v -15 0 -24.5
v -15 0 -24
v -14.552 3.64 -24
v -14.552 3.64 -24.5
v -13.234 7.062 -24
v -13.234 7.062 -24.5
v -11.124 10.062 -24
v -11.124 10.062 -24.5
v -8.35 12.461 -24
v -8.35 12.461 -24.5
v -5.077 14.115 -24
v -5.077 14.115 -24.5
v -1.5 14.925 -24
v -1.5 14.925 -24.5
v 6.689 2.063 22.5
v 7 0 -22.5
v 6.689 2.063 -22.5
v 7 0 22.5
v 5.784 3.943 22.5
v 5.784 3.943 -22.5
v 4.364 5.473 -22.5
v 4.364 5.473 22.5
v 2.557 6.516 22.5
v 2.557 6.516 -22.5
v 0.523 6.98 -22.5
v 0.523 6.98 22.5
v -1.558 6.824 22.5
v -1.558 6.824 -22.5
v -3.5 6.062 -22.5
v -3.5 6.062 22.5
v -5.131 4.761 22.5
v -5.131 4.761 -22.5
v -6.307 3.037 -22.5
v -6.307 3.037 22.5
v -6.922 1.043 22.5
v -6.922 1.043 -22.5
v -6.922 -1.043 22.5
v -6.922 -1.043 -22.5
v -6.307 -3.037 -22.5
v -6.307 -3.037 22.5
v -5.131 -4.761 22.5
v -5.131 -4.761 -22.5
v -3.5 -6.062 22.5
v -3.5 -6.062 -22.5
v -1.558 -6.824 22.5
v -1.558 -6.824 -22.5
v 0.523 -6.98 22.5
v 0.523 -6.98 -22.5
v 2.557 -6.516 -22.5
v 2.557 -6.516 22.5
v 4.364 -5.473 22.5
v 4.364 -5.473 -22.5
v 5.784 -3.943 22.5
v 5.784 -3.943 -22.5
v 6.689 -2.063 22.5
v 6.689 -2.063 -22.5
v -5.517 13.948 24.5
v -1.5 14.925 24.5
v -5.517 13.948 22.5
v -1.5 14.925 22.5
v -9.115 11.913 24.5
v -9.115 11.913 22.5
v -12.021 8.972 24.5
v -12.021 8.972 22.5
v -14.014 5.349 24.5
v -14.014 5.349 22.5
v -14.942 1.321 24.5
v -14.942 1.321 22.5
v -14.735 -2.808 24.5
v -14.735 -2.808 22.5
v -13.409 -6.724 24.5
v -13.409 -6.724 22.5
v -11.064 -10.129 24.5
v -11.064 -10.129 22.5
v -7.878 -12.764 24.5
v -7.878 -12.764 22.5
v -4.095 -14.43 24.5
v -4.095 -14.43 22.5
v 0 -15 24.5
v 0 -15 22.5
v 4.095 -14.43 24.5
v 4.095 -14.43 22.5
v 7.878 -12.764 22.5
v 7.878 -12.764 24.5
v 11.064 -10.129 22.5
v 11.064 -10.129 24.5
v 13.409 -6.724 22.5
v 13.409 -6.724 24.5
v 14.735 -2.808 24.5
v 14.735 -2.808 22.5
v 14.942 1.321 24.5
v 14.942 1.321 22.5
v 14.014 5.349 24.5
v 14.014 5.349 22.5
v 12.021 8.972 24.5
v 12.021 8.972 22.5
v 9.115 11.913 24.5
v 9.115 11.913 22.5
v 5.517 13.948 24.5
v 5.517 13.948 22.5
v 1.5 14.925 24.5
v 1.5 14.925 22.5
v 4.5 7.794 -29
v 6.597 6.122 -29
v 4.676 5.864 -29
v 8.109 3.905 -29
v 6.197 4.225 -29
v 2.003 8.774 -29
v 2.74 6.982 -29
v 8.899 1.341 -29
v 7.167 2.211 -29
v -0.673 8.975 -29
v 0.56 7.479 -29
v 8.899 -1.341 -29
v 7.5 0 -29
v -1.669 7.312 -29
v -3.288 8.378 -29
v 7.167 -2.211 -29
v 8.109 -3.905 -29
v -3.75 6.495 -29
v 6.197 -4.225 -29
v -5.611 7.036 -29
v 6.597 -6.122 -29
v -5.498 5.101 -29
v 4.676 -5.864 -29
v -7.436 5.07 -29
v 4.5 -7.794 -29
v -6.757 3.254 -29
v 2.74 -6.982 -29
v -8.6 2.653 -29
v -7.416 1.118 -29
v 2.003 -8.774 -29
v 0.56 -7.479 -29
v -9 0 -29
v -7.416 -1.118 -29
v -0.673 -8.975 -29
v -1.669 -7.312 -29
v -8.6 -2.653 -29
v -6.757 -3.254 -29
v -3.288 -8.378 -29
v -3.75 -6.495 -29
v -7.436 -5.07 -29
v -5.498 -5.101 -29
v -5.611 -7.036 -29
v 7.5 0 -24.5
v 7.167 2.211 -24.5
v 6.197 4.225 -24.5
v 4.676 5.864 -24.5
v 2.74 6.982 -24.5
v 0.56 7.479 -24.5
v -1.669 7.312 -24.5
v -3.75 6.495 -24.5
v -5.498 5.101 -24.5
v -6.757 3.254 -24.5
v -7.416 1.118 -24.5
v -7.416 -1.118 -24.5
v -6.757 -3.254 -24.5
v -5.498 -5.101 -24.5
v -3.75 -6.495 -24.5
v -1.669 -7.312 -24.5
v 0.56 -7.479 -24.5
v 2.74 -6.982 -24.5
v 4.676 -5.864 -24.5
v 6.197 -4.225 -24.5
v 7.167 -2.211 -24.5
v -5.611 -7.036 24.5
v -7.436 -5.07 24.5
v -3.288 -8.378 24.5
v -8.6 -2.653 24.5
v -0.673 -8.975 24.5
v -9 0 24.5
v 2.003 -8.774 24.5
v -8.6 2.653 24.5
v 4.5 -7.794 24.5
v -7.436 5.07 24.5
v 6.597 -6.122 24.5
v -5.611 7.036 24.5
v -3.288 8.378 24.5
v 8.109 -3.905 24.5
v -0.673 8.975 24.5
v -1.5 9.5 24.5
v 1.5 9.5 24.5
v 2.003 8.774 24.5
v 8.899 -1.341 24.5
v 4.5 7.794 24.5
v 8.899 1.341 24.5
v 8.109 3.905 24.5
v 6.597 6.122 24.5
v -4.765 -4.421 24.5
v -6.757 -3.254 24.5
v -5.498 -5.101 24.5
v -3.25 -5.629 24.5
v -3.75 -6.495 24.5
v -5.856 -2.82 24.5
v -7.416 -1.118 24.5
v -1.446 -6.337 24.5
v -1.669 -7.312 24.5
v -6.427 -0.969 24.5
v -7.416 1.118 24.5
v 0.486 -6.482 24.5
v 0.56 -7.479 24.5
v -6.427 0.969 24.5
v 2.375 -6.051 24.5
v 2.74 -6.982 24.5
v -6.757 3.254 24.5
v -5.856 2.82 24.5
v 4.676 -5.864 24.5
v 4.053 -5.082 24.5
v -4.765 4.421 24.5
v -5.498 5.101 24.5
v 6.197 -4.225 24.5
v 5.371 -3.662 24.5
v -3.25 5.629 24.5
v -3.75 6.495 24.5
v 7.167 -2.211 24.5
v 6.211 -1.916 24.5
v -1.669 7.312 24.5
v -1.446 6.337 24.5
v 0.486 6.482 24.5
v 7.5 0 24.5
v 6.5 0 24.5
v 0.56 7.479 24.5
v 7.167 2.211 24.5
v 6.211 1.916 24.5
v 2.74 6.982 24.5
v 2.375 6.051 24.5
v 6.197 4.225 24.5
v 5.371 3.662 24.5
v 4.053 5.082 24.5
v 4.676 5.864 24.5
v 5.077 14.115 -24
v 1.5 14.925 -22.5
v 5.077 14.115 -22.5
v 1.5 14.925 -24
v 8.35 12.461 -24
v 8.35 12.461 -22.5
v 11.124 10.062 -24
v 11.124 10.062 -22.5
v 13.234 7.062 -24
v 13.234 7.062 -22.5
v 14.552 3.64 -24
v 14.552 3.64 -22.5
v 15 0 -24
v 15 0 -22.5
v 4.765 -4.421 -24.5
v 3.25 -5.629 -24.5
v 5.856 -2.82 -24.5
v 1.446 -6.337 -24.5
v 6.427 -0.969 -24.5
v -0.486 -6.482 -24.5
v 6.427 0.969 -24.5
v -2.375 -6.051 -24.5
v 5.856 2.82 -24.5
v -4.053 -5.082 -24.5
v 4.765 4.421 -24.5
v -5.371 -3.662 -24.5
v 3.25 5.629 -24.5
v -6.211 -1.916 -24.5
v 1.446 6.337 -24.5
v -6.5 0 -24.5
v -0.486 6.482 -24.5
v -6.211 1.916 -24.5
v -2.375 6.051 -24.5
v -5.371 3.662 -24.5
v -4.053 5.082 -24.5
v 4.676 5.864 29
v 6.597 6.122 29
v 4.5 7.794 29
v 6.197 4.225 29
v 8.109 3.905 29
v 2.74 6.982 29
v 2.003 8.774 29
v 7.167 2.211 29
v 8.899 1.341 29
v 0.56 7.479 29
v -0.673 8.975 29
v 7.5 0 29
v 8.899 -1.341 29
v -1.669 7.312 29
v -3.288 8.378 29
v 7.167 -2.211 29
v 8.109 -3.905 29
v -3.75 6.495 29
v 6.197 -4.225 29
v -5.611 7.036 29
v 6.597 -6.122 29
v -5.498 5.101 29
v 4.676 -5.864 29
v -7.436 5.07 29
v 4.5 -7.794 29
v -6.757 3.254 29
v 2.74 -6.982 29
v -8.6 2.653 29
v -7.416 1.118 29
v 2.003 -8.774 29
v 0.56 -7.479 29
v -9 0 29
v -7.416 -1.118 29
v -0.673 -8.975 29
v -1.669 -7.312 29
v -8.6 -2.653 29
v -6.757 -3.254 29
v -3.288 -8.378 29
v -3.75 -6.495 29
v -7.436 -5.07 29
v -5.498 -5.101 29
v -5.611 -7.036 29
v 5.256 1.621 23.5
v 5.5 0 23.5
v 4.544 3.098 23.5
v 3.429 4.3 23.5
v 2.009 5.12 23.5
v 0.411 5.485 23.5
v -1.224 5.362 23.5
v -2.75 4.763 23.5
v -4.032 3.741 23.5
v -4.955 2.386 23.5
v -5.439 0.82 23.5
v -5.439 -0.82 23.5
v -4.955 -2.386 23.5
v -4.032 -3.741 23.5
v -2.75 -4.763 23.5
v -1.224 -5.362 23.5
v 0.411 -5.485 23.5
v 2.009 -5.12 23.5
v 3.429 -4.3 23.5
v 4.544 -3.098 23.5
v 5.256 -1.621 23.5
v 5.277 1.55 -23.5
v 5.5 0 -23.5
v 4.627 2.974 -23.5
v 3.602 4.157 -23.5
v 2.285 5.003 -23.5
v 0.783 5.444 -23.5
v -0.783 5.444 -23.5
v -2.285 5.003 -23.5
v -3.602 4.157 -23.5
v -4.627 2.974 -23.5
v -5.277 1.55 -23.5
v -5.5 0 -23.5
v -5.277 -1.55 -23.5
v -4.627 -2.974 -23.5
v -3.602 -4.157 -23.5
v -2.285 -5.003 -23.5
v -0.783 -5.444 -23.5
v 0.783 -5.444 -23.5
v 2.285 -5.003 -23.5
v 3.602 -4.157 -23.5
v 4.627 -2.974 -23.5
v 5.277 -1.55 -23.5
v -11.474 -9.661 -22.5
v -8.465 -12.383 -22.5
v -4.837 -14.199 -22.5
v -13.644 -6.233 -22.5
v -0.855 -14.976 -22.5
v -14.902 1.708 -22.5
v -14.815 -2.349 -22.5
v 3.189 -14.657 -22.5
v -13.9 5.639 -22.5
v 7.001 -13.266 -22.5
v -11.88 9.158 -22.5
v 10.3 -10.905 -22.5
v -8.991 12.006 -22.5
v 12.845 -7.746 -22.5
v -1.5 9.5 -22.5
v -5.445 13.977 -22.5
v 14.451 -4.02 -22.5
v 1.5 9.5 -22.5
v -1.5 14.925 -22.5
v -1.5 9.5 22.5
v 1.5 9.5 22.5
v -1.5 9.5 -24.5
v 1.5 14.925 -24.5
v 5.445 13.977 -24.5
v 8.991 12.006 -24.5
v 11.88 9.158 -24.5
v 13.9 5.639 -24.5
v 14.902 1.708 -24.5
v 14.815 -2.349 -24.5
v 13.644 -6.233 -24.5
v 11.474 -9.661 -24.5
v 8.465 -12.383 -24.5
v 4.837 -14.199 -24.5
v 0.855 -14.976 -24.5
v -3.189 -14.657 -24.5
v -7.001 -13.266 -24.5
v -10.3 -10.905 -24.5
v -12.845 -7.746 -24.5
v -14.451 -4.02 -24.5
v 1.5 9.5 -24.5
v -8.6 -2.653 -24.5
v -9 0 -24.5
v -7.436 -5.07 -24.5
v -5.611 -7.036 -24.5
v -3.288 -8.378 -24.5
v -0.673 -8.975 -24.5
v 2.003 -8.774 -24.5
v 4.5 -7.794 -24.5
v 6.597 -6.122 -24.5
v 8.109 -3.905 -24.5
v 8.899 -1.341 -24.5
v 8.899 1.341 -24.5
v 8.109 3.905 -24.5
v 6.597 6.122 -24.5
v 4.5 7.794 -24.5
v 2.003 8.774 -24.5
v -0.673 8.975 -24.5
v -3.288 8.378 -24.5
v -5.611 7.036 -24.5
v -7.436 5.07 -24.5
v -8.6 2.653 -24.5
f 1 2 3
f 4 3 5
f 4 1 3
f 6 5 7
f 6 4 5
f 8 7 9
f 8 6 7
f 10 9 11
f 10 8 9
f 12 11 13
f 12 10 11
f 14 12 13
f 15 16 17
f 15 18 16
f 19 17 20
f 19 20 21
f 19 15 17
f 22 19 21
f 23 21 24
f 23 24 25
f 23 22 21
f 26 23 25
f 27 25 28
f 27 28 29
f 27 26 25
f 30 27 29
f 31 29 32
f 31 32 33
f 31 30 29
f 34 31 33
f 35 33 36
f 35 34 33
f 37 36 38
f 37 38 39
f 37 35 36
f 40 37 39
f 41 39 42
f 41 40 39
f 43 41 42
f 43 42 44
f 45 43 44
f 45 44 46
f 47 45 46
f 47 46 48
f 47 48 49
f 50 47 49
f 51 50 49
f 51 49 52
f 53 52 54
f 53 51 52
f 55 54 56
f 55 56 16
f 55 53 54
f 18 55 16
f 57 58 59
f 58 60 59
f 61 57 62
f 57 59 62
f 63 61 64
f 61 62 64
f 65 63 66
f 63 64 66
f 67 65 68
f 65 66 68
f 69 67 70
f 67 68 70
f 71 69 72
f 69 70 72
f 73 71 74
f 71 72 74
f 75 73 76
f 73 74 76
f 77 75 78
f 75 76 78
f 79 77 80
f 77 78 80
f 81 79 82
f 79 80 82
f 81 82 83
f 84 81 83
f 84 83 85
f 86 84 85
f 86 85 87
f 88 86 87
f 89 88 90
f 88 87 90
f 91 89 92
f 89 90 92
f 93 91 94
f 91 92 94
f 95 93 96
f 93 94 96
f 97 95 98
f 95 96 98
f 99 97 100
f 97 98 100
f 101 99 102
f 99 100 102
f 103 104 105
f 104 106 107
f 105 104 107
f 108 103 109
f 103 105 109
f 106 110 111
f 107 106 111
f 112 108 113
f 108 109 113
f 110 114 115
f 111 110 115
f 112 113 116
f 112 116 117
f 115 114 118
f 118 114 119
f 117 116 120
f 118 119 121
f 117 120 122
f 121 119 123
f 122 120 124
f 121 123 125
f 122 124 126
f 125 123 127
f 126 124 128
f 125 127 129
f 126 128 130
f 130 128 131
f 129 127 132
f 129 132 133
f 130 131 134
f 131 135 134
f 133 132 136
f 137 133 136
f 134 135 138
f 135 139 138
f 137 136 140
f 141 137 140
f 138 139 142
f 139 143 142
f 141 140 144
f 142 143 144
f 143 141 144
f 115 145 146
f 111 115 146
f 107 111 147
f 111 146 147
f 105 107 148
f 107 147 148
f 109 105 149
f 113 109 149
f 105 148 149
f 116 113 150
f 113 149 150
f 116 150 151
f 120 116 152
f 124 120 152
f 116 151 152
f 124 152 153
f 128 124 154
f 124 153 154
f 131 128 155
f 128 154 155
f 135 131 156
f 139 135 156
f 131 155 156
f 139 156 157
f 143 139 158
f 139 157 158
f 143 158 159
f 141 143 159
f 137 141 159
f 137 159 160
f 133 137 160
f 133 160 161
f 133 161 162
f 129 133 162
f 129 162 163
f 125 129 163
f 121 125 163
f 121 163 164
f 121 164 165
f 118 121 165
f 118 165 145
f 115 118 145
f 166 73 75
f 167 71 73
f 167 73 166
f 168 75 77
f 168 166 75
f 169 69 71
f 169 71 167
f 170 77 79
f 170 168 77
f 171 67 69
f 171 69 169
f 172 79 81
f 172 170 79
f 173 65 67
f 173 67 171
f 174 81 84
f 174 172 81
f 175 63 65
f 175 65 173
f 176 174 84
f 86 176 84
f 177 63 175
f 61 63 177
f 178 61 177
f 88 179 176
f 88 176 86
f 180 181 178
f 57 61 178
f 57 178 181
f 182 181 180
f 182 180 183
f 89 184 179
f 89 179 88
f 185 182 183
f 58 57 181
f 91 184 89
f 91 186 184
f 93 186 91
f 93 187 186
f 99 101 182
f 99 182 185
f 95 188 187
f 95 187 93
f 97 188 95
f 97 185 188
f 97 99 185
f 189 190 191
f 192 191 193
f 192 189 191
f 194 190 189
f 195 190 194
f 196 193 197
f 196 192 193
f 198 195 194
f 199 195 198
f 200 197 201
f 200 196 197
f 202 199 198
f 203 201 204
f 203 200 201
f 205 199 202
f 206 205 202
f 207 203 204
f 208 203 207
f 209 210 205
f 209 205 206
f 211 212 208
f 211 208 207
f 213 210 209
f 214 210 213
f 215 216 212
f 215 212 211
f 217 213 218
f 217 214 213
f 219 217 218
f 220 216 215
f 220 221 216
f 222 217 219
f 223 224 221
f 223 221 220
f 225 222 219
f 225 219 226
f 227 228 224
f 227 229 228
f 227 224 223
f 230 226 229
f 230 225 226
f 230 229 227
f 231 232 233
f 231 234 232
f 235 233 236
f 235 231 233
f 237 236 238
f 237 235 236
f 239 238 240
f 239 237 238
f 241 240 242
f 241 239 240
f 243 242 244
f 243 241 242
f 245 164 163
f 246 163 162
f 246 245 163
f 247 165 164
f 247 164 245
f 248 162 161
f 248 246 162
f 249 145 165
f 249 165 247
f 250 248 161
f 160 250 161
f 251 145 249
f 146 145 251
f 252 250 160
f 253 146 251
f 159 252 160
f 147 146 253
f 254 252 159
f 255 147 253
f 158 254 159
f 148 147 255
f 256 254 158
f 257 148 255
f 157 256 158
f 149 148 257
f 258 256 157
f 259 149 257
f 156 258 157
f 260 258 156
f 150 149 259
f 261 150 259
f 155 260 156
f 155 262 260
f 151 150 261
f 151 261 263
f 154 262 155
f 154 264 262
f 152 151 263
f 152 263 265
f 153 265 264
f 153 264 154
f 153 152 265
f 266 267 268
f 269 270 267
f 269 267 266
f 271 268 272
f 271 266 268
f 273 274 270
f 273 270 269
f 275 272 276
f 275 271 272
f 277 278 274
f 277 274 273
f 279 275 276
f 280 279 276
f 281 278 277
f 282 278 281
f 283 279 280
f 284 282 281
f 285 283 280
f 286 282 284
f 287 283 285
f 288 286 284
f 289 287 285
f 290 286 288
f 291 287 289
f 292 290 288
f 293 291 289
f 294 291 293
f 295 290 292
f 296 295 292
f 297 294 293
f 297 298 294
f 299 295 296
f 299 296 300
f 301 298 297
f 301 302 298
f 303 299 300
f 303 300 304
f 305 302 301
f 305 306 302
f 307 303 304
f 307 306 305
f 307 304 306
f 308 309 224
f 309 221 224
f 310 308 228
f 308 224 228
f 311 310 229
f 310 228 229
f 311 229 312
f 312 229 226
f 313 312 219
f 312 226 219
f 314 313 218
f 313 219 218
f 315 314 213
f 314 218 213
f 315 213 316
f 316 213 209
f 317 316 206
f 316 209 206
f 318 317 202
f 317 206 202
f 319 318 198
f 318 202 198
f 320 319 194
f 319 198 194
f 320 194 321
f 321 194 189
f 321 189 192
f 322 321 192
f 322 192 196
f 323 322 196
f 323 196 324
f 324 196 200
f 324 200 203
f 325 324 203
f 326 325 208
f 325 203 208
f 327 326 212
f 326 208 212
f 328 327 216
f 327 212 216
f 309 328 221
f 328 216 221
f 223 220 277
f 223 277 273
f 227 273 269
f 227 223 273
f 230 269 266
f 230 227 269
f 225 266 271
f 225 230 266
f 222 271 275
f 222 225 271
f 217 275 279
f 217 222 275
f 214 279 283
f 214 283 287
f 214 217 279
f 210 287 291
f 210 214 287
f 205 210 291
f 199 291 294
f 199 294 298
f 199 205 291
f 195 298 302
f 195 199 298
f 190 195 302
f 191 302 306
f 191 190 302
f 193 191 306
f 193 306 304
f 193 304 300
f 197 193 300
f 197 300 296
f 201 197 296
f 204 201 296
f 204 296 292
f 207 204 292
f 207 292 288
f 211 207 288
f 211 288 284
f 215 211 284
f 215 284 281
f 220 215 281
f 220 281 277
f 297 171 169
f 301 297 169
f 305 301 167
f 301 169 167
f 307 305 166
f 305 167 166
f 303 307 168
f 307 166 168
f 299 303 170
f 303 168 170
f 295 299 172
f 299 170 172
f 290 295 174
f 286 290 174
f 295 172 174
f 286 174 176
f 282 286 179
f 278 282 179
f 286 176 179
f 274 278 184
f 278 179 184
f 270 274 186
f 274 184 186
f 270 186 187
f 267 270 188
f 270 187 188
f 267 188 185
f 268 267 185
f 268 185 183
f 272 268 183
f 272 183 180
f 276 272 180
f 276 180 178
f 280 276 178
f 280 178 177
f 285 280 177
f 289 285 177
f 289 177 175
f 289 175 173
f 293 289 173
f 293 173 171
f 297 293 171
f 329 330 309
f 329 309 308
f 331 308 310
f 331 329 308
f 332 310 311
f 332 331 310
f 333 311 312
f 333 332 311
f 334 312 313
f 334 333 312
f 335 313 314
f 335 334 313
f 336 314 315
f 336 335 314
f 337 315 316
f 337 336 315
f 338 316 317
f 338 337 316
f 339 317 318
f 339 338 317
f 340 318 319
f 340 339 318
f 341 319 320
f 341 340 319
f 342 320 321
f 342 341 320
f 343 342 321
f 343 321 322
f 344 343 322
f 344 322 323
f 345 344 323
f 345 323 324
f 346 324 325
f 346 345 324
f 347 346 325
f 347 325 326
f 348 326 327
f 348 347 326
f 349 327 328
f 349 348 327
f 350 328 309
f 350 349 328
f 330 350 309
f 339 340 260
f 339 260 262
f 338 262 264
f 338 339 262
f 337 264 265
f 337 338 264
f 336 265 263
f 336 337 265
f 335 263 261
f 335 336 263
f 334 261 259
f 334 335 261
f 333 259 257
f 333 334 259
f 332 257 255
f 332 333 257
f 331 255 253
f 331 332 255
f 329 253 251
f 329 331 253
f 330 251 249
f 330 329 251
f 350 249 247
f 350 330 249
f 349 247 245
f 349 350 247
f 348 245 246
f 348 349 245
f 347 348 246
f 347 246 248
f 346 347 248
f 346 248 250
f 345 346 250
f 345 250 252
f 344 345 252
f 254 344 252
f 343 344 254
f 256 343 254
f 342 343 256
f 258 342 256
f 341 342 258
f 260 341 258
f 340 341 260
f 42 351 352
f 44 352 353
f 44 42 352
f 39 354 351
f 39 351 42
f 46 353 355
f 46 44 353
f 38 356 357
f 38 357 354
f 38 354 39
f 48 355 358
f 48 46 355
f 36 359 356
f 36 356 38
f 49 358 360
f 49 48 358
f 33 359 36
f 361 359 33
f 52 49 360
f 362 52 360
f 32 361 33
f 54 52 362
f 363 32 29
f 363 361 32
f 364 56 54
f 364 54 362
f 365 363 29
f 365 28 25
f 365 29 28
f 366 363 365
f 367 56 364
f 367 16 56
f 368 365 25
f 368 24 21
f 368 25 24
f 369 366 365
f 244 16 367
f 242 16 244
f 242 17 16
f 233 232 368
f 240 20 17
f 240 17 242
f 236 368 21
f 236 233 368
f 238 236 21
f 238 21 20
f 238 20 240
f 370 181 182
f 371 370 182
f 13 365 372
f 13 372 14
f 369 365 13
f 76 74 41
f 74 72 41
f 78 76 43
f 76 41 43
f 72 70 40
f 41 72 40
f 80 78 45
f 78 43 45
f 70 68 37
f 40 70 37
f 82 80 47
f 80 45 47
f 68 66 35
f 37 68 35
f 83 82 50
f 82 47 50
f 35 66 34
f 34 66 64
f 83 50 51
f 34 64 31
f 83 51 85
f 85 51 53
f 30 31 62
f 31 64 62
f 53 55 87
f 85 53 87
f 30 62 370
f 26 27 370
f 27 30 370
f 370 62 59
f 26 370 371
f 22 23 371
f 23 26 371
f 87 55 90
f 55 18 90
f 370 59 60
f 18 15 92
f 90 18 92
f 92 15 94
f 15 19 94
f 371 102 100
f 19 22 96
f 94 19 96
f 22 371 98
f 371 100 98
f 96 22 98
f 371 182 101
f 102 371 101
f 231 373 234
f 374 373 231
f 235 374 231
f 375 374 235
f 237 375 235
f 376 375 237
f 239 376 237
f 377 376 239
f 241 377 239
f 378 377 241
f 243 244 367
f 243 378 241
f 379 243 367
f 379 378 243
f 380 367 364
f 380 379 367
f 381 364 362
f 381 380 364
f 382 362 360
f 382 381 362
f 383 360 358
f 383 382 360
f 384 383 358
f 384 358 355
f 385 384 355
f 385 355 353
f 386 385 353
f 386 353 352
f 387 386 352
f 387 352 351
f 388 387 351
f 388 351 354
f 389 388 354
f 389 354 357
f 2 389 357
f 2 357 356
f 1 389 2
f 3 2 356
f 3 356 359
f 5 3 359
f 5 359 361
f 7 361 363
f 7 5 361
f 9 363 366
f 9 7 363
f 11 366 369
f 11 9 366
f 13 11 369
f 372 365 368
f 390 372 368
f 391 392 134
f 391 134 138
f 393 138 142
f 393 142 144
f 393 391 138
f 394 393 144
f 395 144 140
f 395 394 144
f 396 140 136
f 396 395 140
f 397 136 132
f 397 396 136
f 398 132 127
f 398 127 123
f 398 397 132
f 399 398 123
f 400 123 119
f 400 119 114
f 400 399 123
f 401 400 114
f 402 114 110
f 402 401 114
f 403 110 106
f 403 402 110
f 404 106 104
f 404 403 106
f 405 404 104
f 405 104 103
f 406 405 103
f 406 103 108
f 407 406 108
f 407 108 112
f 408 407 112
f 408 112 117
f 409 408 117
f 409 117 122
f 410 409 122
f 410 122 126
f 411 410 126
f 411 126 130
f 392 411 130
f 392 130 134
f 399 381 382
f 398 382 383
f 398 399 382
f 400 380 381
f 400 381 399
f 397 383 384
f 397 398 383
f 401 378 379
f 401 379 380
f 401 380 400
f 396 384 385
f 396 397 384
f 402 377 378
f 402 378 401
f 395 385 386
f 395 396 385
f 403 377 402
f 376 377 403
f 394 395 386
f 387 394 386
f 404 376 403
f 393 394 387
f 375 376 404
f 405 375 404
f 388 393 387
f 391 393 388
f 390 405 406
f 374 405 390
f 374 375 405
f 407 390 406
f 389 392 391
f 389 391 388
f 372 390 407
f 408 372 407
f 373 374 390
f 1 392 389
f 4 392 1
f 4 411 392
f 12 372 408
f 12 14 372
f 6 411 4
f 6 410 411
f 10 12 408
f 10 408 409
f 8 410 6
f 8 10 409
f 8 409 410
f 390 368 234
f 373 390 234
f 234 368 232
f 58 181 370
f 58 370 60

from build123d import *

# Parameters (mm, degrees)
SKETCH_1_R             = 7
SKETCH_1_R_2           = 5.5
EXTRUDE_1_DEPTH        = 29.5
EXTRUDE_START          = -7
SKETCH_2_R             = 15
SKETCH_2_R_2           = 5.5
EXTRUDE_2_DEPTH        = 7
SKETCH_5_W             = 5.5
SKETCH_5_H             = 9
CUT_EXTRUDE_4_DEPTH    = 15
HOLE_WIZARD_M3_1_D     = 2.5
HOLE_WIZARD_M3_1_DEPTH = 9.5
HOLE_WIZARD_M3_1_TIP   = 0.751075774
CHAMFER_1_SIZE         = 0.5
CHAMFER_2_SIZE         = 2
SKETCH1_R              = 7.5
EXTRUDE1_DEPTH         = 5
SKETCH2_W              = 25
SKETCH2_H              = 6
EXTRUDE2_DEPTH         = 5.5
CHAMFER2_SIZE          = 2
SKETCH4_R              = 17.5
EXTRUDE3_DEPTH         = 5.5
SKETCH5_R              = 17.5
EXTRUDE4_DEPTH         = 5.5
SKETCH6_R              = 9
SKETCH6_R_2            = 7.5
EXTRUDE5_DEPTH         = 5
SKETCH7_R              = 15
SKETCH7_R_2            = 5.5
EXTRUDE6_DEPTH         = 0.5
EXTRUDE7_START         = 0.5
SKETCH8_R              = 15
SKETCH8_R_2            = 5.5
EXTRUDE7_DEPTH         = 0.5
CHAMFER3_SIZE          = 1
EXTRUDE10_REACH        = 59.552
SKETCH11_W             = 3
SKETCH11_H             = 5.5


with BuildPart() as part:
    # 草图1 → 拉伸1 (new, symmetric)
    with BuildSketch(Plane.XY):
        Circle(SKETCH_1_R)
        Circle(SKETCH_1_R_2, mode=Mode.SUBTRACT)
    extrude(amount=EXTRUDE_1_DEPTH, both=True)

    # 草图2 → 拉伸2 (add)
    with BuildSketch(Plane.XY.offset(29.5).offset(EXTRUDE_START)):
        Circle(SKETCH_2_R)
        Circle(SKETCH_2_R_2, mode=Mode.SUBTRACT)
    extrude_2 = extrude(amount=EXTRUDE_2_DEPTH)

    # 镜向1: 拉伸2 across plane
    add(extrude_2.mirror(Plane.XY))

    # 草图5 → 拉伸4 (cut, symmetric)
    with BuildSketch(Plane(origin=(0, 0, 0), x_dir=(0, 0, -1), z_dir=(1, 0, 0))):
        with Locations((-26.75, -15.5)):
            Rectangle(SKETCH_5_W, SKETCH_5_H)
        with Locations((26.75, -15.5)):
            Rectangle(SKETCH_5_W, SKETCH_5_H)
    extrude(amount=CUT_EXTRUDE_4_DEPTH, both=True, mode=Mode.SUBTRACT)

    # M3 螺纹孔1
    with Locations(Plane(origin=(-8, -11, 27.5), x_dir=(0, 0, -1), z_dir=(0, -1, 0))):
        with Locations((0, 0), (0, 16), (55, 0), (55, 16)):
            Hole(HOLE_WIZARD_M3_1_D / 2, depth=HOLE_WIZARD_M3_1_DEPTH)
            with Locations((0, 0, -(HOLE_WIZARD_M3_1_DEPTH + HOLE_WIZARD_M3_1_TIP / 2))):  # 118° drill point
                Cone(0, HOLE_WIZARD_M3_1_D / 2, HOLE_WIZARD_M3_1_TIP, mode=Mode.SUBTRACT)

    # 倒角1
    chamfer_1_edges = [part.edges().sort_by_distance(p)[0] for p in [
        (8, -11, -28.75),
        (-8, -11, -28.75),
        (8, -11, 26.25),
        (-8, -11, 26.25),
    ]]
    chamfer(chamfer_1_edges, length=CHAMFER_1_SIZE)

    # 倒角2
    chamfer_2_edges = [part.edges().sort_by_distance(p)[0] for p in [
        (-5.5, 0, -29.5),
    ]]
    chamfer(chamfer_2_edges, length=CHAMFER_2_SIZE)

    # Sketch1 → Extrude1 (cut)
    with BuildSketch(Plane(origin=(0, 0, 29.5), x_dir=(-1, 0, 0), z_dir=(0, 0, -1))):
        Circle(SKETCH1_R)
    extrude(amount=EXTRUDE1_DEPTH, mode=Mode.SUBTRACT)

    # Sketch2 → Extrude2 (cut)
    with BuildSketch(Plane.XY.offset(-29.5)):
        with Locations((0, 12)):
            Rectangle(SKETCH2_W, SKETCH2_H)
    extrude(amount=EXTRUDE2_DEPTH, mode=Mode.SUBTRACT)

    # Chamfer2
    # the kernel refuses this chamfer: 2 mm, written as the material it takes off along each edge
    with BuildSketch(Plane(origin=(0, 0, 29.5), x_dir=(-1, 0, 0), z_dir=(0, -1, 0))) as chamfer2_piece_1:
        Polygon((7.5, CHAMFER2_SIZE), (7.5 + CHAMFER2_SIZE, 0), (7.5, 0), align=None)
    revolve(axis=Axis((0, 0, 29.5), (0, 0, -1)), mode=Mode.SUBTRACT)

    # Sketch4 → Extrude3 (cut)
    with BuildSketch(Plane.XY.offset(29.5)):
        Circle(SKETCH4_R)
    extrude(amount=-EXTRUDE3_DEPTH, mode=Mode.SUBTRACT)

    # Sketch5 → Extrude4 (cut)
    with BuildSketch(Plane(origin=(0, 0, -29.5), x_dir=(-1, 0, 0), z_dir=(0, 0, -1))):
        Circle(SKETCH5_R)
    extrude(amount=-EXTRUDE4_DEPTH, mode=Mode.SUBTRACT)

    # Sketch6 → Extrude5 (add)
    with BuildSketch(Plane.XY.offset(24)):
        with Locations(Location((0, 0, 0), (0, 0, 180))):
            Circle(SKETCH6_R)
        Circle(SKETCH6_R_2, mode=Mode.SUBTRACT)
    extrude5 = extrude(amount=EXTRUDE5_DEPTH)

    # Mirror1: Extrude5 across plane
    add(extrude5.mirror(Plane.XY))

    # Sketch7 → Extrude6 (add)
    with BuildSketch(Plane.XY.offset(24)):
        Circle(SKETCH7_R)
        Circle(SKETCH7_R_2, mode=Mode.SUBTRACT)
    extrude(amount=EXTRUDE6_DEPTH)

    # Sketch8 → Extrude7 (add)
    with BuildSketch(Plane(origin=(0, 0, -24), x_dir=(-1, 0, 0), z_dir=(0, 0, -1)).offset(EXTRUDE7_START)):
        Circle(SKETCH8_R)
        Circle(SKETCH8_R_2, mode=Mode.SUBTRACT)
    extrude(amount=-EXTRUDE7_DEPTH)

    # Chamfer3
    # the kernel refuses this chamfer: 1 mm, written as the material it takes off along each edge
    with BuildSketch(Plane(origin=(0, 0, 24.5), x_dir=(1, 0, 0), z_dir=(0, -1, 0))) as chamfer3_piece_1:
        Polygon((5.5, -CHAMFER3_SIZE), (5.5 + CHAMFER3_SIZE, 0), (5.5, 0), align=None)
    revolve(axis=Axis((0, 0, 24.5), (0, 0, 1)), mode=Mode.SUBTRACT)
    with BuildSketch(Plane(origin=(0, 0, -24.5), x_dir=(-1, 0, 0), z_dir=(0, -1, 0))) as chamfer3_piece_2:
        Polygon((5.5 + CHAMFER3_SIZE, 0), (5.5, -CHAMFER3_SIZE), (5.5, 0), align=None)
    revolve(axis=Axis((0, 0, -24.5), (0, 0, -1)), mode=Mode.SUBTRACT)

    # Extrude10: up to this face of the body (flat: up to its plane)
    extrude10_end = Plane(part.part.faces().sort_by_distance((14.575735931, 0, -24.5))[0])
    # Sketch11 → Extrude10 (cut, up to the picked face)
    with BuildSketch(Plane.XY.offset(24.5), mode=Mode.PRIVATE) as extrude10_sk1:
        with Locations((0, 12.25)):
            Rectangle(SKETCH11_W, SKETCH11_H)
    extrude10_tool1 = split(extrude(extrude10_sk1.sketch, amount=-EXTRUDE10_REACH, mode=Mode.PRIVATE), bisect_by=extrude10_end, keep=Keep.BOTH, mode=Mode.PRIVATE)
    add(extrude10_tool1.solids().sort_by(Axis((0, 12.25, 24.5), (0, 0, -1)))[0], mode=Mode.SUBTRACT)


solid = part.part
